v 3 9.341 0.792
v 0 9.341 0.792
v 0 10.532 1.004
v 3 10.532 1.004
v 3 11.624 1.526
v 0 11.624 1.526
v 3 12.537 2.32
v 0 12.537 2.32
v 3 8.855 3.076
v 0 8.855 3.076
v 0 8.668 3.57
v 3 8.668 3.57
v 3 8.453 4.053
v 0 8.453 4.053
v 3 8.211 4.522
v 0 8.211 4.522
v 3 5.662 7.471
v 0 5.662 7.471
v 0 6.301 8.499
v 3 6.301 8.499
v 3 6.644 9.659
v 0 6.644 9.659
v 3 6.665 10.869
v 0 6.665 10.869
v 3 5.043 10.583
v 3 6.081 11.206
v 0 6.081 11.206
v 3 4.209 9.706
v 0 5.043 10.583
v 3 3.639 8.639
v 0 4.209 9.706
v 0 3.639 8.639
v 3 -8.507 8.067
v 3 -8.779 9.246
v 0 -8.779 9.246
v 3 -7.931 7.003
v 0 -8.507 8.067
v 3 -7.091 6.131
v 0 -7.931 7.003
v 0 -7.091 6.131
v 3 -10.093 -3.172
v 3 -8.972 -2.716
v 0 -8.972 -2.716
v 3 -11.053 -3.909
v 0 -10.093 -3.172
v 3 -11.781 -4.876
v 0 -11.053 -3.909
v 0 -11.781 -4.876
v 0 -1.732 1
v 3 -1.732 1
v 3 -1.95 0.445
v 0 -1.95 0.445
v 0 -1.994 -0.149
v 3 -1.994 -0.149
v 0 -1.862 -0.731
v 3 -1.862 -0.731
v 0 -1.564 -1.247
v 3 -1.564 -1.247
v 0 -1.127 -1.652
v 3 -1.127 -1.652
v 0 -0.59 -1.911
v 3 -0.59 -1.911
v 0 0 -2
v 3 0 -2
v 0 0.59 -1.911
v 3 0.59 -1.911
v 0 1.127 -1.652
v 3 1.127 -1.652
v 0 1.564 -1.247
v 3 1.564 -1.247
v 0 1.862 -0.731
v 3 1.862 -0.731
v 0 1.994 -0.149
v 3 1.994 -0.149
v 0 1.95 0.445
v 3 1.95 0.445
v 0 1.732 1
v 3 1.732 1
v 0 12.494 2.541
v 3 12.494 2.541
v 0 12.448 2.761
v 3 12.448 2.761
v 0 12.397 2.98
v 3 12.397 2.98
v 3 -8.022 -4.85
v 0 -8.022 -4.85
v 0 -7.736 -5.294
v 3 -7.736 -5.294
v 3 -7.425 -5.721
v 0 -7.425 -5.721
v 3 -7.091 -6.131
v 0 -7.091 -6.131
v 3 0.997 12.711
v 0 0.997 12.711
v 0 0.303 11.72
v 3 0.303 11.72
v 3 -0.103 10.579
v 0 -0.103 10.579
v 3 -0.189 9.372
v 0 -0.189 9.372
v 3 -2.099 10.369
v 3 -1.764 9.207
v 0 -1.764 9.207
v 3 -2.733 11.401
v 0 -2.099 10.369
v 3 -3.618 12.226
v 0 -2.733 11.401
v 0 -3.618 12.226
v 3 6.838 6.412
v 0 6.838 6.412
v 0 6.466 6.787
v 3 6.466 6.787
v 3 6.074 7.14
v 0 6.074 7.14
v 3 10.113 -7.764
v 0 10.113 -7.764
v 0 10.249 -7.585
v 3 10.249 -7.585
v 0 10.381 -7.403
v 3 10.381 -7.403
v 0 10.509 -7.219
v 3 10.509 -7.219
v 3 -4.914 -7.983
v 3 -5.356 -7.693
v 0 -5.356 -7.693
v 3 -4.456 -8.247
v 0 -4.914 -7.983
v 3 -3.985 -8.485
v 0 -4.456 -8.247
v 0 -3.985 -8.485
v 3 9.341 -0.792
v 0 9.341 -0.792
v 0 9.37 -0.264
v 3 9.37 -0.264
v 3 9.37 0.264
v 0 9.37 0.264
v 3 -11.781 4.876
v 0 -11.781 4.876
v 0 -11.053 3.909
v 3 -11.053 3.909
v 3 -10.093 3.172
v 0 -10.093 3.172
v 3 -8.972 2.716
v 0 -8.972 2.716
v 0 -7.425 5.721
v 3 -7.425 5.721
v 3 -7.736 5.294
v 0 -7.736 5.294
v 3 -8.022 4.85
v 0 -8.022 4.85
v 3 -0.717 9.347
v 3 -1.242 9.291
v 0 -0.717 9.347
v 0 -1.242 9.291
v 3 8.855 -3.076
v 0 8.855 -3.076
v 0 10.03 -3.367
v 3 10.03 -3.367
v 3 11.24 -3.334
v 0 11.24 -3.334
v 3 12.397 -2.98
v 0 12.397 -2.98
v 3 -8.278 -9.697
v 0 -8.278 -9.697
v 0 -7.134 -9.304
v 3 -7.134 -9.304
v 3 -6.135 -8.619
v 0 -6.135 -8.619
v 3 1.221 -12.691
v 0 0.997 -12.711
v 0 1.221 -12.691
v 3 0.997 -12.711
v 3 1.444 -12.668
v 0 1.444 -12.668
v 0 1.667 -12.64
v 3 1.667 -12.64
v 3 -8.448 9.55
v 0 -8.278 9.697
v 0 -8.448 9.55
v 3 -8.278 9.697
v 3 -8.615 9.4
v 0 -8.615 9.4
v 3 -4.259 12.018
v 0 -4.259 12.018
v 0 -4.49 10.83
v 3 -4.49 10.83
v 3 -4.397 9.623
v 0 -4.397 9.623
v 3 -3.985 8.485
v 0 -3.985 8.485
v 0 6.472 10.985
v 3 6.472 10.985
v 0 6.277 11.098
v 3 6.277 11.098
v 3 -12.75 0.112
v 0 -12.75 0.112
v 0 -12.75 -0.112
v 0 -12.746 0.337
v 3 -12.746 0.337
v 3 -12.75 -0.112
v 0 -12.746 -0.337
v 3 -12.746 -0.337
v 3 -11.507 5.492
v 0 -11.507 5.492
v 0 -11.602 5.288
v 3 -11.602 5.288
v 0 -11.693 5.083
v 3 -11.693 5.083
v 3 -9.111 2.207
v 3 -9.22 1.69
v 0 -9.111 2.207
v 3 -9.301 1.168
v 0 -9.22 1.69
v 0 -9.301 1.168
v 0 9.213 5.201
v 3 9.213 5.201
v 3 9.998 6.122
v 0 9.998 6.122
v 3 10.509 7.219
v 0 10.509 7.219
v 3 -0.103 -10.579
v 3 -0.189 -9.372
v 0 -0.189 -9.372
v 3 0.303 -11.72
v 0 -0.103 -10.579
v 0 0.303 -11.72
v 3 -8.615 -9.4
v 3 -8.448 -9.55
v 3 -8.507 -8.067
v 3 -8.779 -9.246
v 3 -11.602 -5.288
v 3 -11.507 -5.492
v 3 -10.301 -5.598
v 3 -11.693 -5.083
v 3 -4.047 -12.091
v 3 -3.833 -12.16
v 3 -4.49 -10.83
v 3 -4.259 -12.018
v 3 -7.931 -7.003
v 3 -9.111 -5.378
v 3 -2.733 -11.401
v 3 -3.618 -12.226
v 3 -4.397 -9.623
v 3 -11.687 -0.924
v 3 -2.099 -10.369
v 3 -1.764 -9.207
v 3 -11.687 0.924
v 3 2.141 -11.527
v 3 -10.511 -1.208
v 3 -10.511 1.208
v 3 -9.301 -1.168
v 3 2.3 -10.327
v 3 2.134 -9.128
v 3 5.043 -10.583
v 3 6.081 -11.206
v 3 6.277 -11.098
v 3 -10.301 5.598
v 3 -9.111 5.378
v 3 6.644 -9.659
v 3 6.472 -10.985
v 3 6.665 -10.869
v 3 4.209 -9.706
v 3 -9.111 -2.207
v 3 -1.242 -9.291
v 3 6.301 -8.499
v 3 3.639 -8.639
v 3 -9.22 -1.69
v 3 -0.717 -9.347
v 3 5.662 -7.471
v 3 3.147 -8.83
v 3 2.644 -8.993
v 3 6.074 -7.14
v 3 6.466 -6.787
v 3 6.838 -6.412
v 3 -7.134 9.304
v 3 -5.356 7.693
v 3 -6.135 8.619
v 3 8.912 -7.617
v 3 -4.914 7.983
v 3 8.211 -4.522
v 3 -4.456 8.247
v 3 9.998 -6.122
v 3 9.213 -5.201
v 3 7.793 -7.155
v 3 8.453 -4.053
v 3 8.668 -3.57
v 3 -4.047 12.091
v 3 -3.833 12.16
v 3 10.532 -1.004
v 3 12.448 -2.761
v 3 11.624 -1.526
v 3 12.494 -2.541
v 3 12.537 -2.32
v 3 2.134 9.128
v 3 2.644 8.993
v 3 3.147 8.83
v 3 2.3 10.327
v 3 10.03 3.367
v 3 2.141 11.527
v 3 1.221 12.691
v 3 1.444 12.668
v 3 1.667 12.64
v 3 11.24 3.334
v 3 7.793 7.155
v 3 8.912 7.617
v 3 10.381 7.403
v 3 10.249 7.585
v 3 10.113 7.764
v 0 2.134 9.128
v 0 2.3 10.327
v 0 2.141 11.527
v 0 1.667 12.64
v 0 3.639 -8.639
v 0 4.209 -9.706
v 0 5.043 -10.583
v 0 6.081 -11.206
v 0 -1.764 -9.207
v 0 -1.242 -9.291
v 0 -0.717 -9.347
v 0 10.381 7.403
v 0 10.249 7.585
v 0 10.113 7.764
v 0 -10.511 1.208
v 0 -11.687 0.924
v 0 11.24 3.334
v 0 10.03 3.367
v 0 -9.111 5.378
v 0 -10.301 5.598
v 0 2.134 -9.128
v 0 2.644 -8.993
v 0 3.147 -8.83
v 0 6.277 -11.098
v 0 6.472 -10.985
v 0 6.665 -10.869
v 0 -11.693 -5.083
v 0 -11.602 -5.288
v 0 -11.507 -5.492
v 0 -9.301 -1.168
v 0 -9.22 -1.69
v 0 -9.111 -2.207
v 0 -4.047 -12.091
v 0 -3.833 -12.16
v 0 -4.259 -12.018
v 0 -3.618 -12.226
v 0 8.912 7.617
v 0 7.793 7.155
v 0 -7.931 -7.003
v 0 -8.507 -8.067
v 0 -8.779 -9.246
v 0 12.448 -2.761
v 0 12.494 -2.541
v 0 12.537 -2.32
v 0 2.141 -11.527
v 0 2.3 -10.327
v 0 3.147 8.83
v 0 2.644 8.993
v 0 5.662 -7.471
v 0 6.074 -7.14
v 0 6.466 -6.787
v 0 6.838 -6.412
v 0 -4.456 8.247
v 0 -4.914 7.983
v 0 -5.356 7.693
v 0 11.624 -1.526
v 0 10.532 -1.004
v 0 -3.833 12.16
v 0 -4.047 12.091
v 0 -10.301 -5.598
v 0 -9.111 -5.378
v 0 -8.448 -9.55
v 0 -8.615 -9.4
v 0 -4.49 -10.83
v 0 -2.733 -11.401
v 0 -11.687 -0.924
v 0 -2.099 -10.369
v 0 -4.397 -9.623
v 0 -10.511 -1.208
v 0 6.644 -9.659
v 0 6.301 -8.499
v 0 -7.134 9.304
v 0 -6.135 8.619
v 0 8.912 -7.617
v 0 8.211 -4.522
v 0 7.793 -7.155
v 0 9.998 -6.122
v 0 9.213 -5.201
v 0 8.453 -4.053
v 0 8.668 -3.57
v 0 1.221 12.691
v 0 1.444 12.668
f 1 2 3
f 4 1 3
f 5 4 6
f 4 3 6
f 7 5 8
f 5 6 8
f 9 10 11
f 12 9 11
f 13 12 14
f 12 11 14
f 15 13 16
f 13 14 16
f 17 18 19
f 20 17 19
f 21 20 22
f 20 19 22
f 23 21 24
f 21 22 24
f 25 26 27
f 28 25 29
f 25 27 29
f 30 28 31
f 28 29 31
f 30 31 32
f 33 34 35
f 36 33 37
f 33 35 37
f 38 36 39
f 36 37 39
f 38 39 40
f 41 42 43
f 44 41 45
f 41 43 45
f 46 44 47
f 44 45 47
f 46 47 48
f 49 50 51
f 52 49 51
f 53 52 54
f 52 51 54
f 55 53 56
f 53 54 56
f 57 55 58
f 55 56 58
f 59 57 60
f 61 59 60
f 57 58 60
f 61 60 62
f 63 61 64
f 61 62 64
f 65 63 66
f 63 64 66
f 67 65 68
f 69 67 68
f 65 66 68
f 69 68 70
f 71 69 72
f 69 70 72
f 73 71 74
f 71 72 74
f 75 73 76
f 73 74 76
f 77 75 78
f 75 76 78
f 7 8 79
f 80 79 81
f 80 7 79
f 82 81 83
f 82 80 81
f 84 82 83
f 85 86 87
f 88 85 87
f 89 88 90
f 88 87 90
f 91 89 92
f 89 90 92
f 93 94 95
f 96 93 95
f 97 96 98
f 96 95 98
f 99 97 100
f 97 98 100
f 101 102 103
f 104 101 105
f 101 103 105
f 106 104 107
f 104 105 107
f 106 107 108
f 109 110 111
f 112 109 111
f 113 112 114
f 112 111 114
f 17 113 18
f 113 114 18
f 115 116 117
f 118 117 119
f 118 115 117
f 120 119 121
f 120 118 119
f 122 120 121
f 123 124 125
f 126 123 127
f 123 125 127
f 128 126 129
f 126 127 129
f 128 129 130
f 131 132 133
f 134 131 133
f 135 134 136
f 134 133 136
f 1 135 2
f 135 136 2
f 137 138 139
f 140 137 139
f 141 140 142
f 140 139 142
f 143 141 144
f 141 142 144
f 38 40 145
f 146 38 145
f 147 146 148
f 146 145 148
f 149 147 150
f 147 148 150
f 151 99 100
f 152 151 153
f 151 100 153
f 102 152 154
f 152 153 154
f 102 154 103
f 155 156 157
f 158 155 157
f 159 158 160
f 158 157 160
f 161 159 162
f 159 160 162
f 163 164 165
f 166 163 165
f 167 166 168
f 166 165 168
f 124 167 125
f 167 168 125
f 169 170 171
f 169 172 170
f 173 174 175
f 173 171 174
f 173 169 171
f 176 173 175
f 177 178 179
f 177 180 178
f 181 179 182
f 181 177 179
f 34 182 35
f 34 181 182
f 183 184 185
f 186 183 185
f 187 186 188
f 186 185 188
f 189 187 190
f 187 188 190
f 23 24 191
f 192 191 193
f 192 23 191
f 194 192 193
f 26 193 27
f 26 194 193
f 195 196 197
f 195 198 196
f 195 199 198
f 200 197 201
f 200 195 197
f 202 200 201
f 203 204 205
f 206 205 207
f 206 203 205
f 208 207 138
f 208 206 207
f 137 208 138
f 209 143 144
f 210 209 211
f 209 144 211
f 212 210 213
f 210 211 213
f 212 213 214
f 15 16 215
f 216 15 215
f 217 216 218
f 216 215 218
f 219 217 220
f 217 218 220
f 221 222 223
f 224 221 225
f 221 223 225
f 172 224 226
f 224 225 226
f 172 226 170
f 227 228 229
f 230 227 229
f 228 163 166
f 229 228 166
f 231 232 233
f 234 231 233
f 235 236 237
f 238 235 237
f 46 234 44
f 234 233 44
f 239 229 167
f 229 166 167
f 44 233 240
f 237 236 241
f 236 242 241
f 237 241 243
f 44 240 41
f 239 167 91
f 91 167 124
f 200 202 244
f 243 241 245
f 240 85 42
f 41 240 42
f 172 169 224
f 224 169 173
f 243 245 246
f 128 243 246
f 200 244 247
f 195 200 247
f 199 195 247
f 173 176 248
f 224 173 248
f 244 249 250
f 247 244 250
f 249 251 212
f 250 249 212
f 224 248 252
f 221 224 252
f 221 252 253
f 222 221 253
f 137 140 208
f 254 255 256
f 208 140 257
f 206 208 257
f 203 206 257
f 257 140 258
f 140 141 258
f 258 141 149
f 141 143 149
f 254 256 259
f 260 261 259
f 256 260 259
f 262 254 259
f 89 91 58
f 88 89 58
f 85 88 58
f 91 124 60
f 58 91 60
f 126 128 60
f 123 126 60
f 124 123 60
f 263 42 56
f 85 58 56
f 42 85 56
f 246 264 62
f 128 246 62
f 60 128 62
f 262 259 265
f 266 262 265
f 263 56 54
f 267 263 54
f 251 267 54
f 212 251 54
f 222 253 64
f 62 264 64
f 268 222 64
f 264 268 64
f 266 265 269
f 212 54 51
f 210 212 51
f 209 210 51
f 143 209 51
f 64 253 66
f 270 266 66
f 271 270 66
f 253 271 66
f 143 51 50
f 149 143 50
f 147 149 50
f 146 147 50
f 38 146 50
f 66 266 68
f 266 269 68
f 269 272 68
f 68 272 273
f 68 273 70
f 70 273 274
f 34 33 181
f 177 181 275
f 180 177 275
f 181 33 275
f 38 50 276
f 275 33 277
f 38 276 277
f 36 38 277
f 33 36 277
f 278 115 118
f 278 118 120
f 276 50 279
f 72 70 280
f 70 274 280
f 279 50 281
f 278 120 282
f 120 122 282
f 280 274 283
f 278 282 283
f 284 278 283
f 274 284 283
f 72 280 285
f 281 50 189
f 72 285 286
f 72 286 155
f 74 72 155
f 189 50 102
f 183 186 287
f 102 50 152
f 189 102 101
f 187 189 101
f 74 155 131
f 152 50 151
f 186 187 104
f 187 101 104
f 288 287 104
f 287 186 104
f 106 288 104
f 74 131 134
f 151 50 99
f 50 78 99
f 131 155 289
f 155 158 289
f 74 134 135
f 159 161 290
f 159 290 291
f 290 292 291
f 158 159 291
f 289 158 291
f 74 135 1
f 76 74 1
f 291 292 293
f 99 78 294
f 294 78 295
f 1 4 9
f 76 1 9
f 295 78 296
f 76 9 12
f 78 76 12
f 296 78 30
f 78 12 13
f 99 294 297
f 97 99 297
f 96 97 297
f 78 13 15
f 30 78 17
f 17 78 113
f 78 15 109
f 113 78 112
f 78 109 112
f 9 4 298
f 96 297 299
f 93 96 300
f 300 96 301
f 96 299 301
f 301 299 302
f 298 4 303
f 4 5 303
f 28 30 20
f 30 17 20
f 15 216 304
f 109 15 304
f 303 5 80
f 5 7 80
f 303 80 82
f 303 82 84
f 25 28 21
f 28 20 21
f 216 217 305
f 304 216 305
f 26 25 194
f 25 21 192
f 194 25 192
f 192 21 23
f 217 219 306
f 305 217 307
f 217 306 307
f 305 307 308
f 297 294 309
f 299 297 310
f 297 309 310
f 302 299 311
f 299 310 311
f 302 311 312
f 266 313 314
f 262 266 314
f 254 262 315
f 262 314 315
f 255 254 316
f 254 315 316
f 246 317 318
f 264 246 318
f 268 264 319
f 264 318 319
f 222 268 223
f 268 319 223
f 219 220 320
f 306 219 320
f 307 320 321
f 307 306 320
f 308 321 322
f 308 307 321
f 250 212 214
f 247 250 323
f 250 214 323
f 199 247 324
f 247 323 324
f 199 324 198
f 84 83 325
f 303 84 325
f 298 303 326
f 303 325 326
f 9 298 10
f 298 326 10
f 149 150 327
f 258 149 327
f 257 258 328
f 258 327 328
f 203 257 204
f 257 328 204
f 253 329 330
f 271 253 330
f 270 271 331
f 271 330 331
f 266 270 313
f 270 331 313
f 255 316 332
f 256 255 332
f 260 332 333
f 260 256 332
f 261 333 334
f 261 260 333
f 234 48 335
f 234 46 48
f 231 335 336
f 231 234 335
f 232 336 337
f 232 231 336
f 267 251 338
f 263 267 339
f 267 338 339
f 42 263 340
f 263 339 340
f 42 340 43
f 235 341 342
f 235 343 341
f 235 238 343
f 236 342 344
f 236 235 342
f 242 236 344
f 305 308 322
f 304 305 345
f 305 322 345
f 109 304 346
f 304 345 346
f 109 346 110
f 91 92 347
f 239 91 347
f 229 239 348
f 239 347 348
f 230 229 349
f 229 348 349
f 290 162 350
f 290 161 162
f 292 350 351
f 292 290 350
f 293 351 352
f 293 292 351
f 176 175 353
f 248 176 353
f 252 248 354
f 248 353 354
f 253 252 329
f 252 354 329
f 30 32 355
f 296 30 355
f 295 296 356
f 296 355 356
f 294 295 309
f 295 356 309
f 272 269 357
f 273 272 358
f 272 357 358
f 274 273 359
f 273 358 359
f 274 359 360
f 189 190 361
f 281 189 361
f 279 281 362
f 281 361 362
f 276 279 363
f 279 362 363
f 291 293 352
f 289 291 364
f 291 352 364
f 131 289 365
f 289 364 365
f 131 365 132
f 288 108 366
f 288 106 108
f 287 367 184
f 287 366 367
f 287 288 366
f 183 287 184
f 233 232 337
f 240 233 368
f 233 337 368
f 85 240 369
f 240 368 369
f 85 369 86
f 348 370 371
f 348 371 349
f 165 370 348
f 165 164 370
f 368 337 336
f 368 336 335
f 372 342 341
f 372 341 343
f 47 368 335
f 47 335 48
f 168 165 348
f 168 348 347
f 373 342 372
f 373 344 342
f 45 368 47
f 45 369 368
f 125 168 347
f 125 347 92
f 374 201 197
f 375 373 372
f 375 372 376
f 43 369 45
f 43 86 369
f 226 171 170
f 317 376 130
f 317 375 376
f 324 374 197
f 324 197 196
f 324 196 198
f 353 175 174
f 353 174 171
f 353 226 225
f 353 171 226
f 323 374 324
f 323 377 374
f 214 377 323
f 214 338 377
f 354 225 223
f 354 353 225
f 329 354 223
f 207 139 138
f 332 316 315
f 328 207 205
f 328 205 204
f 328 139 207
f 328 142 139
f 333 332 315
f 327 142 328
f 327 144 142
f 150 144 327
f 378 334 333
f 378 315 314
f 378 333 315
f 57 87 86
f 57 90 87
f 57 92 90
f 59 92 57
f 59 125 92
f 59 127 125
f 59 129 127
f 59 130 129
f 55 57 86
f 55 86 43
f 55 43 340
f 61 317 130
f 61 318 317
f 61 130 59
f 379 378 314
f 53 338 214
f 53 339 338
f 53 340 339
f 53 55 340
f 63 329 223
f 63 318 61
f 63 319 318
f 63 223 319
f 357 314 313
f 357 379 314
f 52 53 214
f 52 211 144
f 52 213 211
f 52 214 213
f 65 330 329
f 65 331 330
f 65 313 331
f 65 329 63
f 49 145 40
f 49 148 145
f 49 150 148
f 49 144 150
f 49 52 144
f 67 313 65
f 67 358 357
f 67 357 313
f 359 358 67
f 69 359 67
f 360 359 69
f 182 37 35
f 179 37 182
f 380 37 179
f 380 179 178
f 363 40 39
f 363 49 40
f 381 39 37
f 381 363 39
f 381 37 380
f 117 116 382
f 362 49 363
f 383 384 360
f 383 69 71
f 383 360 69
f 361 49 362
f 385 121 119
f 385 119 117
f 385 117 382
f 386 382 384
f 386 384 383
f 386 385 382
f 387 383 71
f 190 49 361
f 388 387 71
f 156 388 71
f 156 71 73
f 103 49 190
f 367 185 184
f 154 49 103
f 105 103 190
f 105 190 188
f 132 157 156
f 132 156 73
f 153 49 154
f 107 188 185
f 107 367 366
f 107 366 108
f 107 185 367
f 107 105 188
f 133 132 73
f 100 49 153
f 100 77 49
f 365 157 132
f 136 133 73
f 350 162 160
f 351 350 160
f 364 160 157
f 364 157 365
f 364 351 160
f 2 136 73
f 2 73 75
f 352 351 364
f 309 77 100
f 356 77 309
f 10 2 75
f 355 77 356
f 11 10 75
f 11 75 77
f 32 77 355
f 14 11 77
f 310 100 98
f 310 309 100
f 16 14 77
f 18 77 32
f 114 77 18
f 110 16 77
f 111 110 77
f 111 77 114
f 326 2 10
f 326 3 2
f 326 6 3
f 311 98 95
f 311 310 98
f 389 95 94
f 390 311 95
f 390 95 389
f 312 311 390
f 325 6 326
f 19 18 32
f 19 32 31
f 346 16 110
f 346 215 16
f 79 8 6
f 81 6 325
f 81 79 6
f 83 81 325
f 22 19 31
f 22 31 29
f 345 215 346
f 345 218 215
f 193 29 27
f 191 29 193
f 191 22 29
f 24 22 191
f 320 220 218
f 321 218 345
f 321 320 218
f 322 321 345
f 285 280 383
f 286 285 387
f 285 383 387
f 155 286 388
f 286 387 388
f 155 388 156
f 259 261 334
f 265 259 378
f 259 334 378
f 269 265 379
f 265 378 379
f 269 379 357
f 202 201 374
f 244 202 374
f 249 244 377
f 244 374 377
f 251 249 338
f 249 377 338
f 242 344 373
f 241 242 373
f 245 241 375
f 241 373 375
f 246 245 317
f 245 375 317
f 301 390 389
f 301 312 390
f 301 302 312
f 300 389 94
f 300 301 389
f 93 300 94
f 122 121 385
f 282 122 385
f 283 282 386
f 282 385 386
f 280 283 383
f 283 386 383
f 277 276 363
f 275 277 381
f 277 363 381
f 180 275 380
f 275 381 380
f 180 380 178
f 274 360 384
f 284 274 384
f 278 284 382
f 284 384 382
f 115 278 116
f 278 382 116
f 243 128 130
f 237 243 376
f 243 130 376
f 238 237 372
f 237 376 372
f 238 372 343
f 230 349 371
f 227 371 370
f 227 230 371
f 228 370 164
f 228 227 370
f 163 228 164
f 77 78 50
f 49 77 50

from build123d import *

# Parameters (mm, degrees)
BASPROSKE_W        = 3
BASPROSKE_H        = 12.75
TOOTHCUT_DEPTH     = 19.27908641
TEETHCUTS_COUNT    = 15
TEETHCUTS_ANGLE    = 336
BORSKE_R           = 2
BORE_DEPTH         = 50.0000508
BOSS_EXTRU_1_START = -3
BOSS_EXTRU_1_DEPTH = 3


with BuildPart() as part:
    # BasProSke → Base-Revolve (revolve)
    with BuildSketch(Plane(origin=(0, 0, 0), x_dir=(1, 0, 0), z_dir=(0, 1, 0)), mode=Mode.PRIVATE) as base_revolve_sk:
        with Locations((1.5, 6.375)):
            Rectangle(BASPROSKE_W, BASPROSKE_H)
    revolve(base_revolve_sk.sketch.rotate(Axis((-10, 0, 0), (1, 0, 0)), 180), axis=Axis((-10, 0, 0), (1, 0, 0)))

    # TooCutSke → ToothCut (cut, through all)
    with BuildSketch(Plane(origin=(0, 0, 0), x_dir=(0, 0, -1), z_dir=(1, 0, 0))):
        with BuildLine():
            ThreePointArc((0.791546546, 9.340520867), (0, 9.374), (-0.791546546, 9.340520867))
            ThreePointArc((-0.791546546, 9.340520867), (-1.235070734, 11.110218102), (-2.344732916, 12.558386549))
            ThreePointArc((-2.344732916, 12.558386549), (0, 12.7754), (2.344732916, 12.558386549))
            ThreePointArc((2.344732916, 12.558386549), (1.235070734, 11.110218102), (0.791546546, 9.340520867))
        make_face()
    toothcut = extrude(amount=TOOTHCUT_DEPTH, mode=Mode.SUBTRACT)

    # TeethCuts: ToothCut ×15 about axis
    teethcuts_axis = Axis((-10, 0, 0), (1, 0, 0))
    for i in range(1, TEETHCUTS_COUNT):
        add(toothcut.rotate(teethcuts_axis, i * TEETHCUTS_ANGLE / (TEETHCUTS_COUNT - 1)), mode=Mode.SUBTRACT)

    # BorSke → Bore (cut, symmetric)
    with BuildSketch(Plane(origin=(0, 0, 0), x_dir=(0, 0, -1), z_dir=(1, 0, 0))):
        with Locations(Location((0, 0, 0), (0, 0, 180))):
            Circle(BORSKE_R)
    extrude(amount=BORE_DEPTH, both=True, mode=Mode.SUBTRACT)

    # Esquisse1 → Boss.-Extru.1 (add)
    with BuildSketch(Plane.ZY.offset(BOSS_EXTRU_1_START)):
        with BuildLine():
            Line((1, 1.732050808), (1, -1.732050808))
            ThreePointArc((1, -1.732050808), (2, 0), (1, 1.732050808))
        make_face()
    extrude(amount=BOSS_EXTRU_1_DEPTH)


solid = part.part
